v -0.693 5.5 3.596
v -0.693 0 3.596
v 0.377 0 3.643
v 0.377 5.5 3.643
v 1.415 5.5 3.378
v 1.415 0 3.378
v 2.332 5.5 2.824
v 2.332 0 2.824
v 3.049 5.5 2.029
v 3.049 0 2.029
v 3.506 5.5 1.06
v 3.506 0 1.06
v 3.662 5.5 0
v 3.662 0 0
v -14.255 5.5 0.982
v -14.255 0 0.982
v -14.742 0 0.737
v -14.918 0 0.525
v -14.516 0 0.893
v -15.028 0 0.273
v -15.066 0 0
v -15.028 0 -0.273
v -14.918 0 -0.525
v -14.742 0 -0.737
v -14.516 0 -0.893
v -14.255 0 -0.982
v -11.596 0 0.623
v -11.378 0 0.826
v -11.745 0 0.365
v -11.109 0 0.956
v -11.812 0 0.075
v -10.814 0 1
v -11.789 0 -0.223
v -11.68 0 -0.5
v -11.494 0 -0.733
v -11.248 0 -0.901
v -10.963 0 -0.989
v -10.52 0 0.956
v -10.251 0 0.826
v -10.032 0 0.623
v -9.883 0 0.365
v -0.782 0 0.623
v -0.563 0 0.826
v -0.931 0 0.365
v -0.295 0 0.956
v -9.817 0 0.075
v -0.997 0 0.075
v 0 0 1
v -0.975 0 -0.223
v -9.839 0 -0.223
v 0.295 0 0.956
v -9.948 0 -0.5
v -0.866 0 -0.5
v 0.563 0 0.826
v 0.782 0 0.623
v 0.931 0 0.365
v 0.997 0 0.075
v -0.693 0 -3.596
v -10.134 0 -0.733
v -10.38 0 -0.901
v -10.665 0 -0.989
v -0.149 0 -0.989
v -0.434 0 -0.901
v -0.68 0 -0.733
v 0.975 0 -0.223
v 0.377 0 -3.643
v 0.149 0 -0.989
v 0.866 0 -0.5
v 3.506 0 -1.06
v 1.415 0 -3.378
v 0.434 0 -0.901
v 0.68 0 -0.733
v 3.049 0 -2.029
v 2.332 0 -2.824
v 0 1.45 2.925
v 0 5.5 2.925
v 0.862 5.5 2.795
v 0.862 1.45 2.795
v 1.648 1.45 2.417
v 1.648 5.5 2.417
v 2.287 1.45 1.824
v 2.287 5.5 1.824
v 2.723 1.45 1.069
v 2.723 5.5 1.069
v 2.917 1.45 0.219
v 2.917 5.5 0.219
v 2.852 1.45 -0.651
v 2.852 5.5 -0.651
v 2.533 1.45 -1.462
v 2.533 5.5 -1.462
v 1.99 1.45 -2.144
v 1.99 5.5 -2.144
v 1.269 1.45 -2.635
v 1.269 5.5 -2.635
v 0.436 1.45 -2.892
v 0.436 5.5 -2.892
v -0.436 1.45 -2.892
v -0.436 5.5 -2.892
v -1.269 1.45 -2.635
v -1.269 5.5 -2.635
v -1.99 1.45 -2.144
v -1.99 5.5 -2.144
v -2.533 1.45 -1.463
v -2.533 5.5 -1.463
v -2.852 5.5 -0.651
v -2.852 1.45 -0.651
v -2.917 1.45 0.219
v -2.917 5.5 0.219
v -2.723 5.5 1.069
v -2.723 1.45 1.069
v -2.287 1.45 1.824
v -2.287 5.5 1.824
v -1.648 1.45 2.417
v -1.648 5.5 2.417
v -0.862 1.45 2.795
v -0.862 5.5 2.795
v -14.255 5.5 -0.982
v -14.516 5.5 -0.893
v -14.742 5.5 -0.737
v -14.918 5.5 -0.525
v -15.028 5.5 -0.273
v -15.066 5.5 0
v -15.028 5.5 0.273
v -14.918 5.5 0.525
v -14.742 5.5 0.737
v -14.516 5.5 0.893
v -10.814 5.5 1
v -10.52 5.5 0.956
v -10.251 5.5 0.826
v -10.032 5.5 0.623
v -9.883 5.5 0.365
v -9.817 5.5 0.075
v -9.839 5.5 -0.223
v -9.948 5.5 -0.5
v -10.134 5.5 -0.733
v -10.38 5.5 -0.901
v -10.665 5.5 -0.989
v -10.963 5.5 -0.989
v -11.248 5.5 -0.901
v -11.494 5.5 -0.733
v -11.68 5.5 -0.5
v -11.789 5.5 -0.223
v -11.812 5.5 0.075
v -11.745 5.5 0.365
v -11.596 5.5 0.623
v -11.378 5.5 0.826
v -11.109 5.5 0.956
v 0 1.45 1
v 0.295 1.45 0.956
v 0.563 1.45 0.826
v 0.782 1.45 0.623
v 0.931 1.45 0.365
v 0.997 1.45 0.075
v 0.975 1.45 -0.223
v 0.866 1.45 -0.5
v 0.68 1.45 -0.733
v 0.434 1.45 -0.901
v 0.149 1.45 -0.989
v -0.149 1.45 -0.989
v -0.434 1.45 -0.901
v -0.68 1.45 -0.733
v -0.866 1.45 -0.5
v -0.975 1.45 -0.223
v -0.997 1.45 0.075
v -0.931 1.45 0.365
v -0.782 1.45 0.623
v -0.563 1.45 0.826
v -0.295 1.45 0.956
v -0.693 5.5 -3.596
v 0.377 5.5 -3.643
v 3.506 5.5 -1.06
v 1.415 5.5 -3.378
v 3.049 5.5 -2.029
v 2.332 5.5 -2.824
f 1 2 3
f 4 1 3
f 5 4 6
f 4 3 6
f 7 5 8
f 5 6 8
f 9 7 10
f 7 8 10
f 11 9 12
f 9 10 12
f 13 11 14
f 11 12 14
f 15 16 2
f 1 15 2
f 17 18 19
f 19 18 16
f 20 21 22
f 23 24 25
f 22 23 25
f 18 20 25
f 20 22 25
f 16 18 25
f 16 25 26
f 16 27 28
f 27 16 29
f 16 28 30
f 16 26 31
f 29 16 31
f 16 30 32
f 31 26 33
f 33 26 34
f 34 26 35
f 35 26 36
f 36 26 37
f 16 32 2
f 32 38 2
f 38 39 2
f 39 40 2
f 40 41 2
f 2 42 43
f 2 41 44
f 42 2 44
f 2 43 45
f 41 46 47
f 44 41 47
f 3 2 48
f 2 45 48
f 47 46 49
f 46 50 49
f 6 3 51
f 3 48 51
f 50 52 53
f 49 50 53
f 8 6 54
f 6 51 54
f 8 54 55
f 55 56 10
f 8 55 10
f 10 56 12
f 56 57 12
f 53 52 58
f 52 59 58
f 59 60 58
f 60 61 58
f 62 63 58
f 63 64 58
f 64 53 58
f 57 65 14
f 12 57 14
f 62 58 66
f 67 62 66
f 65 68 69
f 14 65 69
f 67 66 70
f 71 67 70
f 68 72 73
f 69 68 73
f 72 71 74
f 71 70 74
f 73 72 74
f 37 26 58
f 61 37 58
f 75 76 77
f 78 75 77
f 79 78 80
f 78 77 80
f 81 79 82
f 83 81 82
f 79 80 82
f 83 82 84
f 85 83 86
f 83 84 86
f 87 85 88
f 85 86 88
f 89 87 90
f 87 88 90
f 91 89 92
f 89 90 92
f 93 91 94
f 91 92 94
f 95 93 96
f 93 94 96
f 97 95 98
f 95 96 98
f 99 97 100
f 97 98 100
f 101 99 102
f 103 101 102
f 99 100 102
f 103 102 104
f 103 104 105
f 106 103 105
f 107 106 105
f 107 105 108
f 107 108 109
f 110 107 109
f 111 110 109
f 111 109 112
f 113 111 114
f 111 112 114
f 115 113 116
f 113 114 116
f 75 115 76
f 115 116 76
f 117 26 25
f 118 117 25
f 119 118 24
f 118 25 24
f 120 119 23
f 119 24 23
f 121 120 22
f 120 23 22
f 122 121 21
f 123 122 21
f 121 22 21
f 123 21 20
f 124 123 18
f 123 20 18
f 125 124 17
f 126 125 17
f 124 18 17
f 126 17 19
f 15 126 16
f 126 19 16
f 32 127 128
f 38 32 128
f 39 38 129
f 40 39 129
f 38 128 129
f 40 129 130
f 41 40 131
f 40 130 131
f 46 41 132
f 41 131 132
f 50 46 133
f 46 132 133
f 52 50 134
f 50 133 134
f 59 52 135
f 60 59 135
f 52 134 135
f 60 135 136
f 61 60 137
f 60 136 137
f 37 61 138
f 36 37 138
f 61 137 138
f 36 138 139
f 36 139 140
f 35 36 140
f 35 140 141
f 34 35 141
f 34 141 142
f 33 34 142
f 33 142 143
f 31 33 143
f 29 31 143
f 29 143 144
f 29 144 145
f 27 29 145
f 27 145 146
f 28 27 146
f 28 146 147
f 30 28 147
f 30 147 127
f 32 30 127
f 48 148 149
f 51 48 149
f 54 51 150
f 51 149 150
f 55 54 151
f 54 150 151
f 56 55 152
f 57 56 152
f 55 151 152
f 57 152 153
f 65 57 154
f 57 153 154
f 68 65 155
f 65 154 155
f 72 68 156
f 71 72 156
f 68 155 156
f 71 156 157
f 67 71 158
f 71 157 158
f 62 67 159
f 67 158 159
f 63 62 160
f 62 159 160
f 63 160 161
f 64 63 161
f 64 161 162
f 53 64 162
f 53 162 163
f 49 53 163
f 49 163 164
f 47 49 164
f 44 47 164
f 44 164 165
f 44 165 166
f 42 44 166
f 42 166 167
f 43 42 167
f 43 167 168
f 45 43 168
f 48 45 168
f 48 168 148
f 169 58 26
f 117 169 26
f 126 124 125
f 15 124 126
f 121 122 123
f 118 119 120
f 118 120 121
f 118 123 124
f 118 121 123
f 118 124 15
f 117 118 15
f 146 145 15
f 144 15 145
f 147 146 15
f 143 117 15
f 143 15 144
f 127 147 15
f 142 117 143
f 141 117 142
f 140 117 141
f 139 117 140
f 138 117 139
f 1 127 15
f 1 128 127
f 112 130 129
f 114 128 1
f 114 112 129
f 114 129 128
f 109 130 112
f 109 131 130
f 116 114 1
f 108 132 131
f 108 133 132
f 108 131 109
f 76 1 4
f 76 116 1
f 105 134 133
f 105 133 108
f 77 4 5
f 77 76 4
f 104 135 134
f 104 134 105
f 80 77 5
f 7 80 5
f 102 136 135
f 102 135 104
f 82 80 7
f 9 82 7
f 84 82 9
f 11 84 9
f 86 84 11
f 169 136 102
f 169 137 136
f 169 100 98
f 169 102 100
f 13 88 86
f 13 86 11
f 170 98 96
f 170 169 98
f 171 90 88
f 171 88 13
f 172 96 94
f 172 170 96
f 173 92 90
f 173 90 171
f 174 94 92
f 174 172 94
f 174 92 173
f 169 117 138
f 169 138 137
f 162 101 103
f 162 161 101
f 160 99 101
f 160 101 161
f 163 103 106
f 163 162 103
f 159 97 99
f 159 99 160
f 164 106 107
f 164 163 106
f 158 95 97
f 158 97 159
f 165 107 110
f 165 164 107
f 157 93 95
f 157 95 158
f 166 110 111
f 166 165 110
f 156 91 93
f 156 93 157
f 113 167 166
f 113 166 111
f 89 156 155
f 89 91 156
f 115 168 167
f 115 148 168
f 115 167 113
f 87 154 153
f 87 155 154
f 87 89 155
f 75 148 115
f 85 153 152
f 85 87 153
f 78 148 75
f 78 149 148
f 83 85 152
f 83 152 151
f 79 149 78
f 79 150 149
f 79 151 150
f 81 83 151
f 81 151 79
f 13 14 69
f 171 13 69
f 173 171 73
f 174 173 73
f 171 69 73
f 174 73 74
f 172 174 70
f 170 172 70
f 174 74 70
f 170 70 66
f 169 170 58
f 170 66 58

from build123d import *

# Parameters (mm, degrees)
EXTRUDE_4_DEPTH      = 5.5
SKETCH_8_R           = 2.925
CUT_EXTRUDE_8_DEPTH  = 4.05
SKETCH_9_R           = 1
CUT_EXTRUDE_9_DEPTH  = 17.451421165
SKETCH_10_R          = 1
CUT_EXTRUDE_10_DEPTH = 17.025035362


with BuildPart() as part:
    # 草图1 → 凸台-拉伸4 (new body)
    with BuildSketch(Plane(origin=(0, 0, 0), x_dir=(1, 0, 0), z_dir=(0, 1, 0))):
        with BuildLine():
            ThreePointArc((3.662209834, 0), (2.331674388, 2.824017602), (-0.693125212, 3.596019787))
            Line((-0.693125212, 3.596019787), (-0.693125212, 0))
            Line((-0.693125212, 0), (3.662209834, 0))
        make_face()
        with BuildLine():
            Line((-0.693125212, 0), (-0.693125212, 3.596019787))
            ThreePointArc((-0.693125212, 3.596019787), (-2.824017602, 2.331674388), (-3.662209834, 0))
            Line((-3.662209834, 0), (-0.693125212, 0))
        make_face()
        with BuildLine():
            Line((3.662209834, 0), (-0.693125212, 0))
            Line((-0.693125212, 0), (-0.693125212, -3.596019787))
            ThreePointArc((-0.693125212, -3.596019787), (2.331674388, -2.824017602), (3.662209834, 0))
        make_face()
        with BuildLine():
            Line((-0.693125212, -3.596019787), (-0.693125212, 0))
            Line((-0.693125212, 0), (-3.662209834, 0))
            ThreePointArc((-3.662209834, 0), (-2.824017602, -2.331674388), (-0.693125212, -3.596019787))
        make_face()
        with BuildLine():
            ThreePointArc((-3.662209834, 0), (-2.824017602, 2.331674388), (-0.693125212, 3.596019787))
            Line((-0.693125212, 3.596019787), (-14.255367792, 0.9819262))
            ThreePointArc((-14.255367792, 0.9819262), (-15.066103593, 0), (-14.255367792, -0.9819262))
            Line((-14.255367792, -0.9819262), (-0.693125212, -3.596019787))
            ThreePointArc((-0.693125212, -3.596019787), (-2.824017602, -2.331674388), (-3.662209834, 0))
        make_face()
    extrude(amount=EXTRUDE_4_DEPTH)

    # 草图8 → 切除-拉伸8 (cut)
    with BuildSketch(Plane(origin=(0, 5.5, 0), x_dir=(1, 0, 0), z_dir=(0, 1, 0))):
        with Locations(Location((0, 0, 0), (0, 0, 270))):
            Circle(SKETCH_8_R)
    extrude(amount=-CUT_EXTRUDE_8_DEPTH, mode=Mode.SUBTRACT)

    # 草图9 → 切除-拉伸9 (cut, through all)
    with BuildSketch(Plane(origin=(0, 5.5, 0), x_dir=(1, 0, 0), z_dir=(0, 1, 0))):
        with Locations(Location((-10.814314949, 0, 0), (0, 0, 270))):
            Circle(SKETCH_9_R)
    extrude(amount=-CUT_EXTRUDE_9_DEPTH, mode=Mode.SUBTRACT)

    # 草图10 → 切除-拉伸10 (cut, through all)
    with BuildSketch(Plane(origin=(0, 1.45, 0), x_dir=(1, 0, 0), z_dir=(0, 1, 0))):
        with Locations(Location((0, 0, 0), (0, 0, 270))):
            Circle(SKETCH_10_R)
    extrude(amount=-CUT_EXTRUDE_10_DEPTH, mode=Mode.SUBTRACT)


solid = part.part
